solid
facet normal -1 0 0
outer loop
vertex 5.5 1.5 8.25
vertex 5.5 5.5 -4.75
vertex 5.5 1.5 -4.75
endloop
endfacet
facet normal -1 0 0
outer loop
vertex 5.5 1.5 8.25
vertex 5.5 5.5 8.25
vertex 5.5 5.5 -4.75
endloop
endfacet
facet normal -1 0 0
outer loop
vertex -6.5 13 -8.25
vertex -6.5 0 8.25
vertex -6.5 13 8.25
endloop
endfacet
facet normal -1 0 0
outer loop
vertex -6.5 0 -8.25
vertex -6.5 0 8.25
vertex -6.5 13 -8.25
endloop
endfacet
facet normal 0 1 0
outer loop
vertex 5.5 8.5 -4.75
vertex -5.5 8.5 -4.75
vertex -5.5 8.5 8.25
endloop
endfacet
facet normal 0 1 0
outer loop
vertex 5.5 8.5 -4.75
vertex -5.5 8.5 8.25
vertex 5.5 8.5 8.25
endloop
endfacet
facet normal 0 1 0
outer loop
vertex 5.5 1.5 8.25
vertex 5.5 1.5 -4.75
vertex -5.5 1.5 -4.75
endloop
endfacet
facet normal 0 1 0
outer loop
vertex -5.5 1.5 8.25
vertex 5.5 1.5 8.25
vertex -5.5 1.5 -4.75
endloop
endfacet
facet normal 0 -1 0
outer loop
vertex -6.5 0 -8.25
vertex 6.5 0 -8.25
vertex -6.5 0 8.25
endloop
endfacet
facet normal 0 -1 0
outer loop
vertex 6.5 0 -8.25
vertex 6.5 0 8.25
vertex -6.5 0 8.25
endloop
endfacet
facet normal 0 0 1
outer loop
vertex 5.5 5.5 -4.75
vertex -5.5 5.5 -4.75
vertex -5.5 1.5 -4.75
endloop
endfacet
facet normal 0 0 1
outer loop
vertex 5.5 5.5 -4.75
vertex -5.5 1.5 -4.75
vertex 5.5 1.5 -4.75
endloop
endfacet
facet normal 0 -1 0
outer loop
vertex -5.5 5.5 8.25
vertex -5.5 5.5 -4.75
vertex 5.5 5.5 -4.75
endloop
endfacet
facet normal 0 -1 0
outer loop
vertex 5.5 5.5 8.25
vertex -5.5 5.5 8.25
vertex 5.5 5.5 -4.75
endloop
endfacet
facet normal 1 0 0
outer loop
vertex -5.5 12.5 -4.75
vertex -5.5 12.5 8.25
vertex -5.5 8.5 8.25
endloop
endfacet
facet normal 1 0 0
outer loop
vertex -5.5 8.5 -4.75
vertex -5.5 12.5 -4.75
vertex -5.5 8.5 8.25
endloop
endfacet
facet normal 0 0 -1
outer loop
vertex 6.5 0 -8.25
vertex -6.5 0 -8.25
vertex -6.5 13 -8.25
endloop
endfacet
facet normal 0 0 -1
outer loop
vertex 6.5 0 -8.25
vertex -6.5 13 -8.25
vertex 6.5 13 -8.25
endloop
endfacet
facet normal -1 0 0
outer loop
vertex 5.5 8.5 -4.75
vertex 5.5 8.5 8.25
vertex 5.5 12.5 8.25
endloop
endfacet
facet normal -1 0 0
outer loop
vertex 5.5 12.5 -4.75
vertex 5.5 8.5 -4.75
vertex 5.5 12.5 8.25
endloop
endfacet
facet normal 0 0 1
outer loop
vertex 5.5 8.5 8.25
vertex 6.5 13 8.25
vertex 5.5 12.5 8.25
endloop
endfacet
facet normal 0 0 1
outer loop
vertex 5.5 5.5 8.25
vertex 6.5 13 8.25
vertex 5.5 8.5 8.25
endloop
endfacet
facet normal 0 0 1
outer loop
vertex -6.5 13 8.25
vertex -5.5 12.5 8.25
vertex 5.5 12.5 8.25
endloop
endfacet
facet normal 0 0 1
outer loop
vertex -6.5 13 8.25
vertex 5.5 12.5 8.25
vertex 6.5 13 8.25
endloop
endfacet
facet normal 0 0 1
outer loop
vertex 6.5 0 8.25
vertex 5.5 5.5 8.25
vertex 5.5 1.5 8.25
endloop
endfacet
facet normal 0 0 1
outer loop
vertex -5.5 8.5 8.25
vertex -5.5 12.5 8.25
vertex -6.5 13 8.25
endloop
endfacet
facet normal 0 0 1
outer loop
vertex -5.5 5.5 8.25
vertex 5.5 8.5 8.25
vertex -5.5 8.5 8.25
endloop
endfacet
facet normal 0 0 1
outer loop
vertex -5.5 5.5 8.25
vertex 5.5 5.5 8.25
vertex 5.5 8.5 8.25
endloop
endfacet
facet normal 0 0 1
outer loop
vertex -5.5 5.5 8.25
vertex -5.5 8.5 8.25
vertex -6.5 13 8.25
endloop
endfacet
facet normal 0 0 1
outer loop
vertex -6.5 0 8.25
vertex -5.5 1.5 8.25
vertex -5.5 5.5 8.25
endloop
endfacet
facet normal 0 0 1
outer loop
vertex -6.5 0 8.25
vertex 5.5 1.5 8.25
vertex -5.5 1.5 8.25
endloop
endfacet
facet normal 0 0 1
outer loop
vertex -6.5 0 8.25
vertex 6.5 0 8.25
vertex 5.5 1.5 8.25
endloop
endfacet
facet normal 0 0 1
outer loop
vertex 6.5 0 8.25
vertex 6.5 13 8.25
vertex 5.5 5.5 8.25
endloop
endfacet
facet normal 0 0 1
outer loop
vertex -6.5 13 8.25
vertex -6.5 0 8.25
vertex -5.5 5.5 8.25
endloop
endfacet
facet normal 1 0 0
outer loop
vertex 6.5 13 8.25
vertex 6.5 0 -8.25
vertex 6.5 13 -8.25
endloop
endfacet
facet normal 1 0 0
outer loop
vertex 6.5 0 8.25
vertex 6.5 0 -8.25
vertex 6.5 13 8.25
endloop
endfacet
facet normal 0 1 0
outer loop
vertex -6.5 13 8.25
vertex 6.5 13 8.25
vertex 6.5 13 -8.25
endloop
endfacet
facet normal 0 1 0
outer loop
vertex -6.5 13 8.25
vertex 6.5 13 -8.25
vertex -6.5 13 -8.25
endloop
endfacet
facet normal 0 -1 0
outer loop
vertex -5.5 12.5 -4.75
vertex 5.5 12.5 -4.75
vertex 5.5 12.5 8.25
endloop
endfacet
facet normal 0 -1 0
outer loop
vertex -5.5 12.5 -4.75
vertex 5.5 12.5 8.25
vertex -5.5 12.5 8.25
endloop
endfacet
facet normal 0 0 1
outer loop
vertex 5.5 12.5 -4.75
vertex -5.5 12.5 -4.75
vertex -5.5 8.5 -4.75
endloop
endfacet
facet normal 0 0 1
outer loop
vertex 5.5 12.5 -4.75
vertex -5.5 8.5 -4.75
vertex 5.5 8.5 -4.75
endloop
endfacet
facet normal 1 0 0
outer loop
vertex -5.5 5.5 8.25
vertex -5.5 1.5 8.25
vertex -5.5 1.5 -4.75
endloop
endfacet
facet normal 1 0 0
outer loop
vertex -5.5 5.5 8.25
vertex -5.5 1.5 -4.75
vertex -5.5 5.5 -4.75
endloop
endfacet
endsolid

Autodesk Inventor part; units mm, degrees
ref_plane "YZ Plane" through (0, 0, 0) normal (1, 0, 0) x (0, 1, 0)
ref_plane "XZ Plane" through (0, 0, 0) normal (0, 1, 0) x (-1, 0, 0)
ref_plane "XY Plane" through (0, 0, 0) normal (0, 0, 1) x (1, 0, 0)
sketch "Sketch1" plane through (0, 0, 0) normal (0, 1, 0) x (-1, 0, 0)
  line L0 (-6.5, 8.25) -> (6.5, 8.25)
  line L1 (6.5, 8.25) -> (6.5, -8.25)
  line L2 (6.5, -8.25) -> (-6.5, -8.25)
  line L3 (-6.5, -8.25) -> (-6.5, 8.25)
  line L4 (-6.5, 8.25) -> (6.5, -8.25) construction
  line L5 (6.5, 8.25) -> (-6.5, -8.25) construction
  point P0 (0, 0)
  dimension "d0" = 13
  dimension "d1" = 16.5
extrude "Extrusion1" add sketch "Sketch1" along normal blind 13
sketch "Sketch2" plane through (-6.5, 0, 8.25) normal (0, 0, 1) x (1, 0, 0)
  line L0 (1, 8.5) -> (12, 8.5)
  line L1 (12, 8.5) -> (12, 12.5)
  line L2 (12, 12.5) -> (1, 12.5)
  line L3 (1, 12.5) -> (1, 8.5)
  line L4 (0, 13) -> (13, 13) projected
  line L5 (0, 0) -> (0, 13) projected
  line L6 (1, 5.5) -> (12, 5.5)
  line L7 (12, 5.5) -> (12, 1.5)
  line L8 (12, 1.5) -> (1, 1.5)
  line L9 (1, 1.5) -> (1, 5.5)
  point P0 (6.5, 0)
  dimension "d4" = 11
  dimension "d5" = 4
  dimension "d6" = 0.5
  dimension "d7" = 1
  dimension "d8" = 11
  dimension "d9" = 4
  dimension "d10" = 3
  dimension "d11" = 1
extrude "Extrusion2" cut sketch "Sketch2" against normal blind 13
properties part number "USB"
